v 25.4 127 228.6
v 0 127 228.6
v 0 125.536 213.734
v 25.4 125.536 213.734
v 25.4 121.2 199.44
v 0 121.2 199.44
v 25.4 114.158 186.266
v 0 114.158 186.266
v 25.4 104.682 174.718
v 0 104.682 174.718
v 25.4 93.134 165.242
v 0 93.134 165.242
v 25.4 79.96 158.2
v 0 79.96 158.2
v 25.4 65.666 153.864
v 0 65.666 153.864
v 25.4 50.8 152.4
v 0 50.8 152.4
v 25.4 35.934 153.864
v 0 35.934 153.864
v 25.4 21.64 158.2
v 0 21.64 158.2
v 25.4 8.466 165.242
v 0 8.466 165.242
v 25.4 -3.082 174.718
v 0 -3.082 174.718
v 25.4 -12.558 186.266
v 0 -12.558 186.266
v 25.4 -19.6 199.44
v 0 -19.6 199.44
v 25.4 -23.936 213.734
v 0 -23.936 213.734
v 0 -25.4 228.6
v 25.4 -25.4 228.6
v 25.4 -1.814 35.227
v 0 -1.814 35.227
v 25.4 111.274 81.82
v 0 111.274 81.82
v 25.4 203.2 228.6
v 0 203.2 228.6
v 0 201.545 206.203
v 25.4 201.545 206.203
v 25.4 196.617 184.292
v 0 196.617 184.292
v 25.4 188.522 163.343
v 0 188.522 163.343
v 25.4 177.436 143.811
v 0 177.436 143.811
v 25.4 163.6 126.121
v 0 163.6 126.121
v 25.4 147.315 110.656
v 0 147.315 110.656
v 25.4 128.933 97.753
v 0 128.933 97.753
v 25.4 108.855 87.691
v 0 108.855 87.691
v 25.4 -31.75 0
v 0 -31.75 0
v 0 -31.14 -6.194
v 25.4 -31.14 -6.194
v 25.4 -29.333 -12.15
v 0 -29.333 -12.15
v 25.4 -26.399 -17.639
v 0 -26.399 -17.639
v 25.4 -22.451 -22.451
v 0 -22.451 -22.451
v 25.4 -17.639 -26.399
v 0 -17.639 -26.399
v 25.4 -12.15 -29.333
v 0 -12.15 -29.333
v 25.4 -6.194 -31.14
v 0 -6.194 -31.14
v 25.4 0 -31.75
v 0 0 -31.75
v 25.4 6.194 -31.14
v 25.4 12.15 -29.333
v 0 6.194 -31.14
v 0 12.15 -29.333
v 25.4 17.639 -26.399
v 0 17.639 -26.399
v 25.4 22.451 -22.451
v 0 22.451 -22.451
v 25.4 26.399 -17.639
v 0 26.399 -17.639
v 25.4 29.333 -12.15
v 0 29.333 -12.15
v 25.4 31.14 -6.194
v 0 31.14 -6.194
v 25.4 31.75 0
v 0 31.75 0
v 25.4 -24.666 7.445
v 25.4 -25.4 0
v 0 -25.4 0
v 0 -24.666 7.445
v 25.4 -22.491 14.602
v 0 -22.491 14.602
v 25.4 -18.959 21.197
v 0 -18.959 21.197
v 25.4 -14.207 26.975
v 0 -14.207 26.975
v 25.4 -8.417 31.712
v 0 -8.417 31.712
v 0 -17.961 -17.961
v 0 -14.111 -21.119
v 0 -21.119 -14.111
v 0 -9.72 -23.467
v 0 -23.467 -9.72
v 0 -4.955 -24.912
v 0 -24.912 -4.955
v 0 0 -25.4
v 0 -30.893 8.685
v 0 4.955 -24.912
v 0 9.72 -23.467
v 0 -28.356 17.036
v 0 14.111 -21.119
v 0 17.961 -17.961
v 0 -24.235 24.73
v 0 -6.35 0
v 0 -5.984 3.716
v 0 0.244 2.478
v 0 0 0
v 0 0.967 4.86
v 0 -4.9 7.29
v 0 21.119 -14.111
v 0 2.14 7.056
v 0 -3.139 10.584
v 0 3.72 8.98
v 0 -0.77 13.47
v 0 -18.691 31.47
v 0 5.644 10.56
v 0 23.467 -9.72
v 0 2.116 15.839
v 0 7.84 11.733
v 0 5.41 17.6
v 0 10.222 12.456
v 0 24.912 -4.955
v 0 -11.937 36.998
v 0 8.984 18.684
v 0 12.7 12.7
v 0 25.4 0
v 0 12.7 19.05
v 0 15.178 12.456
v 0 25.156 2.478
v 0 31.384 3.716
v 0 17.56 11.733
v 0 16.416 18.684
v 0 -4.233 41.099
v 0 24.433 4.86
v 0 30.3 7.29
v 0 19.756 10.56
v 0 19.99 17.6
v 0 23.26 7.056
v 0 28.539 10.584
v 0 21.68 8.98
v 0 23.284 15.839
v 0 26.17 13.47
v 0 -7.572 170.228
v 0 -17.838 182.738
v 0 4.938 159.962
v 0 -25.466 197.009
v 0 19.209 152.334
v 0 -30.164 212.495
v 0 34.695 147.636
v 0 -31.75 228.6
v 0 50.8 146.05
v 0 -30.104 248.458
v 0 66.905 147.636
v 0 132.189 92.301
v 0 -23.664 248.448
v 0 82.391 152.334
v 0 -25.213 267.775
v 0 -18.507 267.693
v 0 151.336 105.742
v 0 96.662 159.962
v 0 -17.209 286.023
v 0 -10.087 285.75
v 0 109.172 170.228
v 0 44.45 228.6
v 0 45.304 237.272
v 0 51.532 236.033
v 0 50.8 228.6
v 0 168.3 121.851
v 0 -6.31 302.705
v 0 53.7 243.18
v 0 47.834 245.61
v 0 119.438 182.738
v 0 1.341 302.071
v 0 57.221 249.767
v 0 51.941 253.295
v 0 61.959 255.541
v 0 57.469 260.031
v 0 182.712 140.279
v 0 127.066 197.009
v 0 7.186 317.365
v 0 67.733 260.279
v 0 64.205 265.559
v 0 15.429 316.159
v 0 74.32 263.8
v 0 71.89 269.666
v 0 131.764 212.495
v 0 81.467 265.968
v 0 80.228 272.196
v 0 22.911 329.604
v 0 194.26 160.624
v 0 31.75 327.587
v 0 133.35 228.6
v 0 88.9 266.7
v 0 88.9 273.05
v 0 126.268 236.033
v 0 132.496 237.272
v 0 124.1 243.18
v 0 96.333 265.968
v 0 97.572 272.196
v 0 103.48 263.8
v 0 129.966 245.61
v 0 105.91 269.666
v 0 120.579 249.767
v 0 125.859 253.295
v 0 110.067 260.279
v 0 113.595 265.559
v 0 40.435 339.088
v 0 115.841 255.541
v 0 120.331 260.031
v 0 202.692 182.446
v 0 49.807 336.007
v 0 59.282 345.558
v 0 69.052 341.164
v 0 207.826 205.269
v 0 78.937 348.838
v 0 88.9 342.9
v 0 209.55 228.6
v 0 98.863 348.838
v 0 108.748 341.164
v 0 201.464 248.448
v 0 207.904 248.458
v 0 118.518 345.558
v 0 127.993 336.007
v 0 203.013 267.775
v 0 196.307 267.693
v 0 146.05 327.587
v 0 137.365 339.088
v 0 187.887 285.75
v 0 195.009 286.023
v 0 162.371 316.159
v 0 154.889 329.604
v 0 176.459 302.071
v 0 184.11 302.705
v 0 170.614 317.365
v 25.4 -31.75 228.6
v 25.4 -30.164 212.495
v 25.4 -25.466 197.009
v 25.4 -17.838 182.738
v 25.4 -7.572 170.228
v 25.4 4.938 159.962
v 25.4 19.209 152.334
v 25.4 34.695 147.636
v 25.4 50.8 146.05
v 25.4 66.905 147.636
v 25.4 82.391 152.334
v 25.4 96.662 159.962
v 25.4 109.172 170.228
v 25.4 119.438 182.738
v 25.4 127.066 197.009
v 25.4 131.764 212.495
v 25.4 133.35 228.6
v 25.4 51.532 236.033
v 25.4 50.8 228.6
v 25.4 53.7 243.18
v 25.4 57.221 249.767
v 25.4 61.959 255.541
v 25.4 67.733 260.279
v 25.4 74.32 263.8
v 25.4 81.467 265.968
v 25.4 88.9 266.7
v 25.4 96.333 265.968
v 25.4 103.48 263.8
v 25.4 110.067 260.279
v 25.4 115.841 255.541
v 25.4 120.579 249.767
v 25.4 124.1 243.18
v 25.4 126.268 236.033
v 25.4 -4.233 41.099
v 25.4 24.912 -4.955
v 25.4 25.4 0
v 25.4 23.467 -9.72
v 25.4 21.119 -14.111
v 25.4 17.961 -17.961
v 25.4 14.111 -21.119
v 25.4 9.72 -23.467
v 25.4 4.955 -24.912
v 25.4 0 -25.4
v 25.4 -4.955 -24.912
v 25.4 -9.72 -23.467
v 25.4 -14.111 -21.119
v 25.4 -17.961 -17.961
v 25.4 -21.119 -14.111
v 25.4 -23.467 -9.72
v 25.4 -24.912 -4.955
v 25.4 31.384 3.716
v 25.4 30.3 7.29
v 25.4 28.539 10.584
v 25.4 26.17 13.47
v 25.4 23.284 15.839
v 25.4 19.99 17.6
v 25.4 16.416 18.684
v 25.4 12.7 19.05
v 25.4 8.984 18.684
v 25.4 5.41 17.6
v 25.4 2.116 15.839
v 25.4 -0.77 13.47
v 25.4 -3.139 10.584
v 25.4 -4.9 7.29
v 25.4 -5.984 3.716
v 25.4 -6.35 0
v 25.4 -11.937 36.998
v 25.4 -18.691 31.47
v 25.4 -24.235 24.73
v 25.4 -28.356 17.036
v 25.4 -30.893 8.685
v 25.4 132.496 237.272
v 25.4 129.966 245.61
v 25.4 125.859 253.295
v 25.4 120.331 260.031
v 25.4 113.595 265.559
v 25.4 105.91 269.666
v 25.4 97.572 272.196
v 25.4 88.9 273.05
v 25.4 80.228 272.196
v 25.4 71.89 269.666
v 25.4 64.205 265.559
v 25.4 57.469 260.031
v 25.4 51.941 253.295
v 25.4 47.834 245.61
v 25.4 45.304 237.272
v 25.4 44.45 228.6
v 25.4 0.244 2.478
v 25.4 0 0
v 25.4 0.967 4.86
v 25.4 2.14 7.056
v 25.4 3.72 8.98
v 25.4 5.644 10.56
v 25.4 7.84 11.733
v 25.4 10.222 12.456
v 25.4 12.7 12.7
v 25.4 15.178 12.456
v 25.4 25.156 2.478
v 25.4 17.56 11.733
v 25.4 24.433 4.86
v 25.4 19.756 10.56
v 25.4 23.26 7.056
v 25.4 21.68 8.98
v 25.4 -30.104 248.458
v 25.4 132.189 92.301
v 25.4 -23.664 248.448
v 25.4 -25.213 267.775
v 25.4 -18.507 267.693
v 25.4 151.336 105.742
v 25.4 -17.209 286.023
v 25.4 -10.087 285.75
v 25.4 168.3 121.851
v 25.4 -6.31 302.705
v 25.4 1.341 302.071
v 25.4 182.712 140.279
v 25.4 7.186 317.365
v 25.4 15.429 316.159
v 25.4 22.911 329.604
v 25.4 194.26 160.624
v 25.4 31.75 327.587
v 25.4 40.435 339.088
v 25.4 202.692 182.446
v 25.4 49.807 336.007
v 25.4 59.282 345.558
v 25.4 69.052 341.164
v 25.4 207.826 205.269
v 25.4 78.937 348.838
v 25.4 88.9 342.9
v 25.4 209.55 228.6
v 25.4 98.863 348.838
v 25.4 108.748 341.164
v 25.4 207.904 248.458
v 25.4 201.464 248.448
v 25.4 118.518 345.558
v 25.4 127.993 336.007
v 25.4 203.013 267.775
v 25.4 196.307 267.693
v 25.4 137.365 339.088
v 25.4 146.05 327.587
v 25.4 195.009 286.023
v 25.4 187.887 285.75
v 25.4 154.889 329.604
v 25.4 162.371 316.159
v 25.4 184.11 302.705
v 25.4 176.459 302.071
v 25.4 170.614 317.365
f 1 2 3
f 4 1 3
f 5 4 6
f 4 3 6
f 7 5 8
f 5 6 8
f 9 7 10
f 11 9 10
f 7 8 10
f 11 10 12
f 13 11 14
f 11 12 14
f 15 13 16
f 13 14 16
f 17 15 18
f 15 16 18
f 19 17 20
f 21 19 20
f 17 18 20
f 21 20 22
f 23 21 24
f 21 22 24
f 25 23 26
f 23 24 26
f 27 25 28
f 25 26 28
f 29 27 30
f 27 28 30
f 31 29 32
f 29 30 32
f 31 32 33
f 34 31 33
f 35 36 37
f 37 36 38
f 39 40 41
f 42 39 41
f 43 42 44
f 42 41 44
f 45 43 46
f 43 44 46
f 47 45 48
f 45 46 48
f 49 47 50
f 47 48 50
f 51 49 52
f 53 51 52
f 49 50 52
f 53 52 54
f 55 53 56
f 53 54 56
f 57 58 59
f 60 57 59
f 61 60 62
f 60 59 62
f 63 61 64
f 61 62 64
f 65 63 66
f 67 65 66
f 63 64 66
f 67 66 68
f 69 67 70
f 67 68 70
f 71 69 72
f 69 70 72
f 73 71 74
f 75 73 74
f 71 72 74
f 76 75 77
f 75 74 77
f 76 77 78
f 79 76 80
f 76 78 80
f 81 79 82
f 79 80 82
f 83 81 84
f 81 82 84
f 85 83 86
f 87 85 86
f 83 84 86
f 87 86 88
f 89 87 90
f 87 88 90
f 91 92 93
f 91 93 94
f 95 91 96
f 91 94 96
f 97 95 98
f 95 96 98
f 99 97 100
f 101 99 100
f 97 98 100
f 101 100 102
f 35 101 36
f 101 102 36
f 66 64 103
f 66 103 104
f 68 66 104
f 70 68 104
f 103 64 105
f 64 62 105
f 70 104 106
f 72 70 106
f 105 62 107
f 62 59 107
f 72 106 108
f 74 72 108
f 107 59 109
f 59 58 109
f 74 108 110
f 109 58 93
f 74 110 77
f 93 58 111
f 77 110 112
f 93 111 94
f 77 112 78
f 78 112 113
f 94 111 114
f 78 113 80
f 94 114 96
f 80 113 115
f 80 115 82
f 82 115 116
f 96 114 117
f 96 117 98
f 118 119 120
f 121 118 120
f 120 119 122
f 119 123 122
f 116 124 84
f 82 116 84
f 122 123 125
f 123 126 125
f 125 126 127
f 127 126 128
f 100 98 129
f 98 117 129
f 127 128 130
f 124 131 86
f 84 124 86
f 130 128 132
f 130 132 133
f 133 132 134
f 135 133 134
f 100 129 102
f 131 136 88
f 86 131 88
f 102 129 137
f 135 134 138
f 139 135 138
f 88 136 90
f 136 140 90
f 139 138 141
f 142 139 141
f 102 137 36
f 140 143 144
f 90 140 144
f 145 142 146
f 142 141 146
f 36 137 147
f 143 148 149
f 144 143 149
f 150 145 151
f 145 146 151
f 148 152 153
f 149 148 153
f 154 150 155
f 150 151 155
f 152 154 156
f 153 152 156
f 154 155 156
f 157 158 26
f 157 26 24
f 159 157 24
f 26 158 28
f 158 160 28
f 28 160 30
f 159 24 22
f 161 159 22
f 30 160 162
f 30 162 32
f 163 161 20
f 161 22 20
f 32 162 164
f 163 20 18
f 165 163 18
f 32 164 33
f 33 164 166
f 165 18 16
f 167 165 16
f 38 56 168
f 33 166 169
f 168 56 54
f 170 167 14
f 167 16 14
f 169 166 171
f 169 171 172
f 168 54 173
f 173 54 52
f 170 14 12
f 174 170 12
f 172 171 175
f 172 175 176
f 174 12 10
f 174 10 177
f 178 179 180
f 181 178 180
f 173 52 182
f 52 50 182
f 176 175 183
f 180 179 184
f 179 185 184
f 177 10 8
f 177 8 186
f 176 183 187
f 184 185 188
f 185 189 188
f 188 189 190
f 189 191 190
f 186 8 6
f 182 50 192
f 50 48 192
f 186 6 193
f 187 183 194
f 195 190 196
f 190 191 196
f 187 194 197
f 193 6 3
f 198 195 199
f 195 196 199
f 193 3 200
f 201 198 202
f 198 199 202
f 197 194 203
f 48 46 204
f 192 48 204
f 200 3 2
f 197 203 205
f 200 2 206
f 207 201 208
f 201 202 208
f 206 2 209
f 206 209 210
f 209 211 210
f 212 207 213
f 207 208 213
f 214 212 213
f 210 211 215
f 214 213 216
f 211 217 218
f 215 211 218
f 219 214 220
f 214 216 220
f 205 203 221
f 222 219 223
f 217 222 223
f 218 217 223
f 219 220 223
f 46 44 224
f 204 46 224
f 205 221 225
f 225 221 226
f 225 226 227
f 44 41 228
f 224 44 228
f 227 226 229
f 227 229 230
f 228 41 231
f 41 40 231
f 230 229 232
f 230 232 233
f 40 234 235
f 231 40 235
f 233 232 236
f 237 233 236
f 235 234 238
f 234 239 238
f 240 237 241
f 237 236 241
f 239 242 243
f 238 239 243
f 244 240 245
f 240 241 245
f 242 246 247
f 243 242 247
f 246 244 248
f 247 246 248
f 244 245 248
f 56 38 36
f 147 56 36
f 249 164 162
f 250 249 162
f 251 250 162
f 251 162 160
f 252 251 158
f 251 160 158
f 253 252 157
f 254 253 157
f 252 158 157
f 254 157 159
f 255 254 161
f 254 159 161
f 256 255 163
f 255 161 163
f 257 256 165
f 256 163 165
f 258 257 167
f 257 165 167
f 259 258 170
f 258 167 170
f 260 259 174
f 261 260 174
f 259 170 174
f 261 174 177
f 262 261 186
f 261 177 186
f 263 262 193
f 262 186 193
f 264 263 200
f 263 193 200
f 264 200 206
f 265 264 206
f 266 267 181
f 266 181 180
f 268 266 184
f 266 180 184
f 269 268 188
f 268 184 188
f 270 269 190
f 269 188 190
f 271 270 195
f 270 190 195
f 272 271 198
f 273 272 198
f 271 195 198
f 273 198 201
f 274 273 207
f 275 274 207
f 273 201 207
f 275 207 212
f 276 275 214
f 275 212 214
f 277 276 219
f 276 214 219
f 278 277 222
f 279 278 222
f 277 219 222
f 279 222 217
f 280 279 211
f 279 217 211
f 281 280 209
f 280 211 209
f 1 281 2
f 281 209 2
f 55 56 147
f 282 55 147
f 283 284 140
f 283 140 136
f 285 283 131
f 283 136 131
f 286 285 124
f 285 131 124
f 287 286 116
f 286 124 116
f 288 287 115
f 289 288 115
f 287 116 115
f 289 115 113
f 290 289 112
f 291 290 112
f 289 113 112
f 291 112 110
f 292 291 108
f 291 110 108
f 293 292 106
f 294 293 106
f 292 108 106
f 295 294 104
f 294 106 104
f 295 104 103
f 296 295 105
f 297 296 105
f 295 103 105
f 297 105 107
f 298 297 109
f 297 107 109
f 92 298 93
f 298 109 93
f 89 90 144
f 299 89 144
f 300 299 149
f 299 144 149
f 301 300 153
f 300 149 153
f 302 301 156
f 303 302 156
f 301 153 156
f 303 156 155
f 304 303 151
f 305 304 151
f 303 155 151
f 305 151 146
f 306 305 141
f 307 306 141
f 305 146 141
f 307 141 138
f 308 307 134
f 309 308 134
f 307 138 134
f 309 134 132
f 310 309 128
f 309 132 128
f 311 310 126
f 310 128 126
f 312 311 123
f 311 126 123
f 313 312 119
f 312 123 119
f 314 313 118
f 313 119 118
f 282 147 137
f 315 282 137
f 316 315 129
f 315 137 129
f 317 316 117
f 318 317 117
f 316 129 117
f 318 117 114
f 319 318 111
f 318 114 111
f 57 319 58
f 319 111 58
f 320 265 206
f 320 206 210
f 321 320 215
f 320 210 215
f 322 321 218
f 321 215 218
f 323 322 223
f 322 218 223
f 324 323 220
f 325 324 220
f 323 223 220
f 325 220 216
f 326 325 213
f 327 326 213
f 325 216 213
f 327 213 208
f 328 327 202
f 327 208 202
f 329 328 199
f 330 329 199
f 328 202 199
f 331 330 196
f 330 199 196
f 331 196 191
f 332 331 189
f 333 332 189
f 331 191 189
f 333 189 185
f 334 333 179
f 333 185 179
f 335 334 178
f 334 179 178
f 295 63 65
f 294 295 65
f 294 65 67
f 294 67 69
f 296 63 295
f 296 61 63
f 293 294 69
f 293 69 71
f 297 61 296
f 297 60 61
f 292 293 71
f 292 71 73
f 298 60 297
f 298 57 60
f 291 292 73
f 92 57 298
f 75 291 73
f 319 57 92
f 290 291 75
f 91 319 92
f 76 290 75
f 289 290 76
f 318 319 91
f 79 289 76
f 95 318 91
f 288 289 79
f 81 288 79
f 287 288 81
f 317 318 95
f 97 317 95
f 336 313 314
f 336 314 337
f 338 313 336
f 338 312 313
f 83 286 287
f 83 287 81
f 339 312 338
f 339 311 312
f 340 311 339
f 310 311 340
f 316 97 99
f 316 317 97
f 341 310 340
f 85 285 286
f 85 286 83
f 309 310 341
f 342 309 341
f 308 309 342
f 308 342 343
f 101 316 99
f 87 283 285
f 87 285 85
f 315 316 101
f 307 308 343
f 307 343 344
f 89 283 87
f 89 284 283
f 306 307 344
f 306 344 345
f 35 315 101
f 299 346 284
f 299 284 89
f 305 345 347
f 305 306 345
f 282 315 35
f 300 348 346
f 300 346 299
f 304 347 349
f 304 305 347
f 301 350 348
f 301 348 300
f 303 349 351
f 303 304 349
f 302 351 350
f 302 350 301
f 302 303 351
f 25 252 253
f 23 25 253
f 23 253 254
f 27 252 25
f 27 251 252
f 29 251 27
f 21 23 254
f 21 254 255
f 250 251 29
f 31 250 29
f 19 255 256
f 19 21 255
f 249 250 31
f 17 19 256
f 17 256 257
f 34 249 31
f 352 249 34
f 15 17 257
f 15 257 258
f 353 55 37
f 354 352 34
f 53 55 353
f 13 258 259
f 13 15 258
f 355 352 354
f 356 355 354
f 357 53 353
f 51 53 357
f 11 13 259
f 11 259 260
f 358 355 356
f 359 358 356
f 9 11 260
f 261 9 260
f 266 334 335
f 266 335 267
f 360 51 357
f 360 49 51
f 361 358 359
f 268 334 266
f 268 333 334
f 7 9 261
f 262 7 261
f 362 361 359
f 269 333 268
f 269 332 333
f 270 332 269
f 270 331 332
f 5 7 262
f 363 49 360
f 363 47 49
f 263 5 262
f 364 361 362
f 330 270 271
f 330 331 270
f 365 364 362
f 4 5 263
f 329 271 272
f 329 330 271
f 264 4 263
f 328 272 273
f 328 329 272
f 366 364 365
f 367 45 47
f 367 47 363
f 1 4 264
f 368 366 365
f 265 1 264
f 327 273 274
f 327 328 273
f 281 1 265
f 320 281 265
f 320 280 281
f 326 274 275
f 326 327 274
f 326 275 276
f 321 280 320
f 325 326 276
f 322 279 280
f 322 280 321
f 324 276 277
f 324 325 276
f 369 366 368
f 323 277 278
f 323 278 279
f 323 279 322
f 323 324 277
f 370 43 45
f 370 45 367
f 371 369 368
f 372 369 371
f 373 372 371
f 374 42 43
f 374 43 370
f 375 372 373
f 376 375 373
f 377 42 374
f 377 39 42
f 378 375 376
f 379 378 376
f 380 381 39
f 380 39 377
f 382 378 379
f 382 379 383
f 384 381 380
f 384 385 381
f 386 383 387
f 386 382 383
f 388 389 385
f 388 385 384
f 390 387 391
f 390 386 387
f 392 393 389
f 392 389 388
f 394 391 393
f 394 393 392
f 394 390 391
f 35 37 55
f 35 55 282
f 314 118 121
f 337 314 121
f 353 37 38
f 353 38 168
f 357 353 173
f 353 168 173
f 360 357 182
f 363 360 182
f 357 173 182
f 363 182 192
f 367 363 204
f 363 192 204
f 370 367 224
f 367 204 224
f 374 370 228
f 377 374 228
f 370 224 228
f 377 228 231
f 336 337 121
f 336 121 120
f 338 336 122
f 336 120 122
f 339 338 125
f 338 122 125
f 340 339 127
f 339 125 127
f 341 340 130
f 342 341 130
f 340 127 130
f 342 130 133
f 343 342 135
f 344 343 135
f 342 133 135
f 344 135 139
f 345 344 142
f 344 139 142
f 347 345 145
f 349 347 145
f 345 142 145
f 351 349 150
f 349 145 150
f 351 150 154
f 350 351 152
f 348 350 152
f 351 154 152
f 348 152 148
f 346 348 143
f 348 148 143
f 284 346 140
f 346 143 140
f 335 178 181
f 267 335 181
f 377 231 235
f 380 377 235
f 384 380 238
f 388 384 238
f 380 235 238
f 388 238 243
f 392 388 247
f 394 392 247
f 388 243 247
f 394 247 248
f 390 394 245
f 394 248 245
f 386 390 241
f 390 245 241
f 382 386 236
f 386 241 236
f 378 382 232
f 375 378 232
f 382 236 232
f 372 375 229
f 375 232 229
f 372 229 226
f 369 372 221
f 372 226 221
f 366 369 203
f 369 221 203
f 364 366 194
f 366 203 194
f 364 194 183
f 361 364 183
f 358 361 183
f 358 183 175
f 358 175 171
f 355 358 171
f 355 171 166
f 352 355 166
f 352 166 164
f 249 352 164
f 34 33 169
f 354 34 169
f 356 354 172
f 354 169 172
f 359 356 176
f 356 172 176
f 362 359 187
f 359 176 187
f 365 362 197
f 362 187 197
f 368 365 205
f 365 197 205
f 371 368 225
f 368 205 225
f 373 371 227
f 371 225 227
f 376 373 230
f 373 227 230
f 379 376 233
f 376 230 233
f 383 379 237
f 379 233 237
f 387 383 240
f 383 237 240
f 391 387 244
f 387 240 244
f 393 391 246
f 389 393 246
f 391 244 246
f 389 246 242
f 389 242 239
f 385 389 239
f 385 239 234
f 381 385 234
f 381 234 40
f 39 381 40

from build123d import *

# Parameters (mm, degrees)
F1_DEPTH = 25.4


with BuildPart() as f1:
    # F0 (on Right) → F1 (new body)
    with BuildSketch(Plane.YZ):
        with BuildLine():
            ThreePointArc((0, 0), (12.7, 12.7), (25.4, 0))
            ThreePointArc((25.4, 0), (0, -25.4), (-25.4, 0))
            ThreePointArc((-25.4, 0), (-18.958987, 21.197135), (-1.813726, 35.227287))
            Line((-1.813726, 35.227287), (111.273858, 81.81964))
            ThreePointArc((111.273858, 81.81964), (182.712446, 140.278607), (209.55, 228.6))
            ThreePointArc((209.55, 228.6), (88.899999, 349.250003), (-31.75, 228.599999))
            ThreePointArc((-31.75, 228.599999), (50.800002, 146.050003), (133.35, 228.600003))
            ThreePointArc((133.35, 228.600003), (88.9, 273.050003), (44.45, 228.600003))
            Line((44.45, 228.600003), (50.8, 228.600003))
            ThreePointArc((50.8, 228.600003), (88.9, 266.700003), (127, 228.600003))
            ThreePointArc((127, 228.600003), (50.8, 152.400003), (-25.4, 228.600003))
            ThreePointArc((-25.4, 228.600003), (88.9, 342.900003), (203.2, 228.600003))
            ThreePointArc((203.2, 228.600003), (177.435949, 143.811464), (108.854904, 87.690855))
            Line((108.854904, 87.690855), (-4.23268, 41.098502))
            ThreePointArc((-4.23268, 41.098502), (-24.235486, 24.72999), (-31.75, -1e-06))
            ThreePointArc((-31.75, -1e-06), (0, -31.75), (31.75, -2e-06))
            ThreePointArc((31.75, -2e-06), (12.700001, 19.05), (-6.35, 0))
            Line((-6.35, 0), (0, 0))
        make_face()
    extrude(amount=F1_DEPTH)


solid = f1.part
